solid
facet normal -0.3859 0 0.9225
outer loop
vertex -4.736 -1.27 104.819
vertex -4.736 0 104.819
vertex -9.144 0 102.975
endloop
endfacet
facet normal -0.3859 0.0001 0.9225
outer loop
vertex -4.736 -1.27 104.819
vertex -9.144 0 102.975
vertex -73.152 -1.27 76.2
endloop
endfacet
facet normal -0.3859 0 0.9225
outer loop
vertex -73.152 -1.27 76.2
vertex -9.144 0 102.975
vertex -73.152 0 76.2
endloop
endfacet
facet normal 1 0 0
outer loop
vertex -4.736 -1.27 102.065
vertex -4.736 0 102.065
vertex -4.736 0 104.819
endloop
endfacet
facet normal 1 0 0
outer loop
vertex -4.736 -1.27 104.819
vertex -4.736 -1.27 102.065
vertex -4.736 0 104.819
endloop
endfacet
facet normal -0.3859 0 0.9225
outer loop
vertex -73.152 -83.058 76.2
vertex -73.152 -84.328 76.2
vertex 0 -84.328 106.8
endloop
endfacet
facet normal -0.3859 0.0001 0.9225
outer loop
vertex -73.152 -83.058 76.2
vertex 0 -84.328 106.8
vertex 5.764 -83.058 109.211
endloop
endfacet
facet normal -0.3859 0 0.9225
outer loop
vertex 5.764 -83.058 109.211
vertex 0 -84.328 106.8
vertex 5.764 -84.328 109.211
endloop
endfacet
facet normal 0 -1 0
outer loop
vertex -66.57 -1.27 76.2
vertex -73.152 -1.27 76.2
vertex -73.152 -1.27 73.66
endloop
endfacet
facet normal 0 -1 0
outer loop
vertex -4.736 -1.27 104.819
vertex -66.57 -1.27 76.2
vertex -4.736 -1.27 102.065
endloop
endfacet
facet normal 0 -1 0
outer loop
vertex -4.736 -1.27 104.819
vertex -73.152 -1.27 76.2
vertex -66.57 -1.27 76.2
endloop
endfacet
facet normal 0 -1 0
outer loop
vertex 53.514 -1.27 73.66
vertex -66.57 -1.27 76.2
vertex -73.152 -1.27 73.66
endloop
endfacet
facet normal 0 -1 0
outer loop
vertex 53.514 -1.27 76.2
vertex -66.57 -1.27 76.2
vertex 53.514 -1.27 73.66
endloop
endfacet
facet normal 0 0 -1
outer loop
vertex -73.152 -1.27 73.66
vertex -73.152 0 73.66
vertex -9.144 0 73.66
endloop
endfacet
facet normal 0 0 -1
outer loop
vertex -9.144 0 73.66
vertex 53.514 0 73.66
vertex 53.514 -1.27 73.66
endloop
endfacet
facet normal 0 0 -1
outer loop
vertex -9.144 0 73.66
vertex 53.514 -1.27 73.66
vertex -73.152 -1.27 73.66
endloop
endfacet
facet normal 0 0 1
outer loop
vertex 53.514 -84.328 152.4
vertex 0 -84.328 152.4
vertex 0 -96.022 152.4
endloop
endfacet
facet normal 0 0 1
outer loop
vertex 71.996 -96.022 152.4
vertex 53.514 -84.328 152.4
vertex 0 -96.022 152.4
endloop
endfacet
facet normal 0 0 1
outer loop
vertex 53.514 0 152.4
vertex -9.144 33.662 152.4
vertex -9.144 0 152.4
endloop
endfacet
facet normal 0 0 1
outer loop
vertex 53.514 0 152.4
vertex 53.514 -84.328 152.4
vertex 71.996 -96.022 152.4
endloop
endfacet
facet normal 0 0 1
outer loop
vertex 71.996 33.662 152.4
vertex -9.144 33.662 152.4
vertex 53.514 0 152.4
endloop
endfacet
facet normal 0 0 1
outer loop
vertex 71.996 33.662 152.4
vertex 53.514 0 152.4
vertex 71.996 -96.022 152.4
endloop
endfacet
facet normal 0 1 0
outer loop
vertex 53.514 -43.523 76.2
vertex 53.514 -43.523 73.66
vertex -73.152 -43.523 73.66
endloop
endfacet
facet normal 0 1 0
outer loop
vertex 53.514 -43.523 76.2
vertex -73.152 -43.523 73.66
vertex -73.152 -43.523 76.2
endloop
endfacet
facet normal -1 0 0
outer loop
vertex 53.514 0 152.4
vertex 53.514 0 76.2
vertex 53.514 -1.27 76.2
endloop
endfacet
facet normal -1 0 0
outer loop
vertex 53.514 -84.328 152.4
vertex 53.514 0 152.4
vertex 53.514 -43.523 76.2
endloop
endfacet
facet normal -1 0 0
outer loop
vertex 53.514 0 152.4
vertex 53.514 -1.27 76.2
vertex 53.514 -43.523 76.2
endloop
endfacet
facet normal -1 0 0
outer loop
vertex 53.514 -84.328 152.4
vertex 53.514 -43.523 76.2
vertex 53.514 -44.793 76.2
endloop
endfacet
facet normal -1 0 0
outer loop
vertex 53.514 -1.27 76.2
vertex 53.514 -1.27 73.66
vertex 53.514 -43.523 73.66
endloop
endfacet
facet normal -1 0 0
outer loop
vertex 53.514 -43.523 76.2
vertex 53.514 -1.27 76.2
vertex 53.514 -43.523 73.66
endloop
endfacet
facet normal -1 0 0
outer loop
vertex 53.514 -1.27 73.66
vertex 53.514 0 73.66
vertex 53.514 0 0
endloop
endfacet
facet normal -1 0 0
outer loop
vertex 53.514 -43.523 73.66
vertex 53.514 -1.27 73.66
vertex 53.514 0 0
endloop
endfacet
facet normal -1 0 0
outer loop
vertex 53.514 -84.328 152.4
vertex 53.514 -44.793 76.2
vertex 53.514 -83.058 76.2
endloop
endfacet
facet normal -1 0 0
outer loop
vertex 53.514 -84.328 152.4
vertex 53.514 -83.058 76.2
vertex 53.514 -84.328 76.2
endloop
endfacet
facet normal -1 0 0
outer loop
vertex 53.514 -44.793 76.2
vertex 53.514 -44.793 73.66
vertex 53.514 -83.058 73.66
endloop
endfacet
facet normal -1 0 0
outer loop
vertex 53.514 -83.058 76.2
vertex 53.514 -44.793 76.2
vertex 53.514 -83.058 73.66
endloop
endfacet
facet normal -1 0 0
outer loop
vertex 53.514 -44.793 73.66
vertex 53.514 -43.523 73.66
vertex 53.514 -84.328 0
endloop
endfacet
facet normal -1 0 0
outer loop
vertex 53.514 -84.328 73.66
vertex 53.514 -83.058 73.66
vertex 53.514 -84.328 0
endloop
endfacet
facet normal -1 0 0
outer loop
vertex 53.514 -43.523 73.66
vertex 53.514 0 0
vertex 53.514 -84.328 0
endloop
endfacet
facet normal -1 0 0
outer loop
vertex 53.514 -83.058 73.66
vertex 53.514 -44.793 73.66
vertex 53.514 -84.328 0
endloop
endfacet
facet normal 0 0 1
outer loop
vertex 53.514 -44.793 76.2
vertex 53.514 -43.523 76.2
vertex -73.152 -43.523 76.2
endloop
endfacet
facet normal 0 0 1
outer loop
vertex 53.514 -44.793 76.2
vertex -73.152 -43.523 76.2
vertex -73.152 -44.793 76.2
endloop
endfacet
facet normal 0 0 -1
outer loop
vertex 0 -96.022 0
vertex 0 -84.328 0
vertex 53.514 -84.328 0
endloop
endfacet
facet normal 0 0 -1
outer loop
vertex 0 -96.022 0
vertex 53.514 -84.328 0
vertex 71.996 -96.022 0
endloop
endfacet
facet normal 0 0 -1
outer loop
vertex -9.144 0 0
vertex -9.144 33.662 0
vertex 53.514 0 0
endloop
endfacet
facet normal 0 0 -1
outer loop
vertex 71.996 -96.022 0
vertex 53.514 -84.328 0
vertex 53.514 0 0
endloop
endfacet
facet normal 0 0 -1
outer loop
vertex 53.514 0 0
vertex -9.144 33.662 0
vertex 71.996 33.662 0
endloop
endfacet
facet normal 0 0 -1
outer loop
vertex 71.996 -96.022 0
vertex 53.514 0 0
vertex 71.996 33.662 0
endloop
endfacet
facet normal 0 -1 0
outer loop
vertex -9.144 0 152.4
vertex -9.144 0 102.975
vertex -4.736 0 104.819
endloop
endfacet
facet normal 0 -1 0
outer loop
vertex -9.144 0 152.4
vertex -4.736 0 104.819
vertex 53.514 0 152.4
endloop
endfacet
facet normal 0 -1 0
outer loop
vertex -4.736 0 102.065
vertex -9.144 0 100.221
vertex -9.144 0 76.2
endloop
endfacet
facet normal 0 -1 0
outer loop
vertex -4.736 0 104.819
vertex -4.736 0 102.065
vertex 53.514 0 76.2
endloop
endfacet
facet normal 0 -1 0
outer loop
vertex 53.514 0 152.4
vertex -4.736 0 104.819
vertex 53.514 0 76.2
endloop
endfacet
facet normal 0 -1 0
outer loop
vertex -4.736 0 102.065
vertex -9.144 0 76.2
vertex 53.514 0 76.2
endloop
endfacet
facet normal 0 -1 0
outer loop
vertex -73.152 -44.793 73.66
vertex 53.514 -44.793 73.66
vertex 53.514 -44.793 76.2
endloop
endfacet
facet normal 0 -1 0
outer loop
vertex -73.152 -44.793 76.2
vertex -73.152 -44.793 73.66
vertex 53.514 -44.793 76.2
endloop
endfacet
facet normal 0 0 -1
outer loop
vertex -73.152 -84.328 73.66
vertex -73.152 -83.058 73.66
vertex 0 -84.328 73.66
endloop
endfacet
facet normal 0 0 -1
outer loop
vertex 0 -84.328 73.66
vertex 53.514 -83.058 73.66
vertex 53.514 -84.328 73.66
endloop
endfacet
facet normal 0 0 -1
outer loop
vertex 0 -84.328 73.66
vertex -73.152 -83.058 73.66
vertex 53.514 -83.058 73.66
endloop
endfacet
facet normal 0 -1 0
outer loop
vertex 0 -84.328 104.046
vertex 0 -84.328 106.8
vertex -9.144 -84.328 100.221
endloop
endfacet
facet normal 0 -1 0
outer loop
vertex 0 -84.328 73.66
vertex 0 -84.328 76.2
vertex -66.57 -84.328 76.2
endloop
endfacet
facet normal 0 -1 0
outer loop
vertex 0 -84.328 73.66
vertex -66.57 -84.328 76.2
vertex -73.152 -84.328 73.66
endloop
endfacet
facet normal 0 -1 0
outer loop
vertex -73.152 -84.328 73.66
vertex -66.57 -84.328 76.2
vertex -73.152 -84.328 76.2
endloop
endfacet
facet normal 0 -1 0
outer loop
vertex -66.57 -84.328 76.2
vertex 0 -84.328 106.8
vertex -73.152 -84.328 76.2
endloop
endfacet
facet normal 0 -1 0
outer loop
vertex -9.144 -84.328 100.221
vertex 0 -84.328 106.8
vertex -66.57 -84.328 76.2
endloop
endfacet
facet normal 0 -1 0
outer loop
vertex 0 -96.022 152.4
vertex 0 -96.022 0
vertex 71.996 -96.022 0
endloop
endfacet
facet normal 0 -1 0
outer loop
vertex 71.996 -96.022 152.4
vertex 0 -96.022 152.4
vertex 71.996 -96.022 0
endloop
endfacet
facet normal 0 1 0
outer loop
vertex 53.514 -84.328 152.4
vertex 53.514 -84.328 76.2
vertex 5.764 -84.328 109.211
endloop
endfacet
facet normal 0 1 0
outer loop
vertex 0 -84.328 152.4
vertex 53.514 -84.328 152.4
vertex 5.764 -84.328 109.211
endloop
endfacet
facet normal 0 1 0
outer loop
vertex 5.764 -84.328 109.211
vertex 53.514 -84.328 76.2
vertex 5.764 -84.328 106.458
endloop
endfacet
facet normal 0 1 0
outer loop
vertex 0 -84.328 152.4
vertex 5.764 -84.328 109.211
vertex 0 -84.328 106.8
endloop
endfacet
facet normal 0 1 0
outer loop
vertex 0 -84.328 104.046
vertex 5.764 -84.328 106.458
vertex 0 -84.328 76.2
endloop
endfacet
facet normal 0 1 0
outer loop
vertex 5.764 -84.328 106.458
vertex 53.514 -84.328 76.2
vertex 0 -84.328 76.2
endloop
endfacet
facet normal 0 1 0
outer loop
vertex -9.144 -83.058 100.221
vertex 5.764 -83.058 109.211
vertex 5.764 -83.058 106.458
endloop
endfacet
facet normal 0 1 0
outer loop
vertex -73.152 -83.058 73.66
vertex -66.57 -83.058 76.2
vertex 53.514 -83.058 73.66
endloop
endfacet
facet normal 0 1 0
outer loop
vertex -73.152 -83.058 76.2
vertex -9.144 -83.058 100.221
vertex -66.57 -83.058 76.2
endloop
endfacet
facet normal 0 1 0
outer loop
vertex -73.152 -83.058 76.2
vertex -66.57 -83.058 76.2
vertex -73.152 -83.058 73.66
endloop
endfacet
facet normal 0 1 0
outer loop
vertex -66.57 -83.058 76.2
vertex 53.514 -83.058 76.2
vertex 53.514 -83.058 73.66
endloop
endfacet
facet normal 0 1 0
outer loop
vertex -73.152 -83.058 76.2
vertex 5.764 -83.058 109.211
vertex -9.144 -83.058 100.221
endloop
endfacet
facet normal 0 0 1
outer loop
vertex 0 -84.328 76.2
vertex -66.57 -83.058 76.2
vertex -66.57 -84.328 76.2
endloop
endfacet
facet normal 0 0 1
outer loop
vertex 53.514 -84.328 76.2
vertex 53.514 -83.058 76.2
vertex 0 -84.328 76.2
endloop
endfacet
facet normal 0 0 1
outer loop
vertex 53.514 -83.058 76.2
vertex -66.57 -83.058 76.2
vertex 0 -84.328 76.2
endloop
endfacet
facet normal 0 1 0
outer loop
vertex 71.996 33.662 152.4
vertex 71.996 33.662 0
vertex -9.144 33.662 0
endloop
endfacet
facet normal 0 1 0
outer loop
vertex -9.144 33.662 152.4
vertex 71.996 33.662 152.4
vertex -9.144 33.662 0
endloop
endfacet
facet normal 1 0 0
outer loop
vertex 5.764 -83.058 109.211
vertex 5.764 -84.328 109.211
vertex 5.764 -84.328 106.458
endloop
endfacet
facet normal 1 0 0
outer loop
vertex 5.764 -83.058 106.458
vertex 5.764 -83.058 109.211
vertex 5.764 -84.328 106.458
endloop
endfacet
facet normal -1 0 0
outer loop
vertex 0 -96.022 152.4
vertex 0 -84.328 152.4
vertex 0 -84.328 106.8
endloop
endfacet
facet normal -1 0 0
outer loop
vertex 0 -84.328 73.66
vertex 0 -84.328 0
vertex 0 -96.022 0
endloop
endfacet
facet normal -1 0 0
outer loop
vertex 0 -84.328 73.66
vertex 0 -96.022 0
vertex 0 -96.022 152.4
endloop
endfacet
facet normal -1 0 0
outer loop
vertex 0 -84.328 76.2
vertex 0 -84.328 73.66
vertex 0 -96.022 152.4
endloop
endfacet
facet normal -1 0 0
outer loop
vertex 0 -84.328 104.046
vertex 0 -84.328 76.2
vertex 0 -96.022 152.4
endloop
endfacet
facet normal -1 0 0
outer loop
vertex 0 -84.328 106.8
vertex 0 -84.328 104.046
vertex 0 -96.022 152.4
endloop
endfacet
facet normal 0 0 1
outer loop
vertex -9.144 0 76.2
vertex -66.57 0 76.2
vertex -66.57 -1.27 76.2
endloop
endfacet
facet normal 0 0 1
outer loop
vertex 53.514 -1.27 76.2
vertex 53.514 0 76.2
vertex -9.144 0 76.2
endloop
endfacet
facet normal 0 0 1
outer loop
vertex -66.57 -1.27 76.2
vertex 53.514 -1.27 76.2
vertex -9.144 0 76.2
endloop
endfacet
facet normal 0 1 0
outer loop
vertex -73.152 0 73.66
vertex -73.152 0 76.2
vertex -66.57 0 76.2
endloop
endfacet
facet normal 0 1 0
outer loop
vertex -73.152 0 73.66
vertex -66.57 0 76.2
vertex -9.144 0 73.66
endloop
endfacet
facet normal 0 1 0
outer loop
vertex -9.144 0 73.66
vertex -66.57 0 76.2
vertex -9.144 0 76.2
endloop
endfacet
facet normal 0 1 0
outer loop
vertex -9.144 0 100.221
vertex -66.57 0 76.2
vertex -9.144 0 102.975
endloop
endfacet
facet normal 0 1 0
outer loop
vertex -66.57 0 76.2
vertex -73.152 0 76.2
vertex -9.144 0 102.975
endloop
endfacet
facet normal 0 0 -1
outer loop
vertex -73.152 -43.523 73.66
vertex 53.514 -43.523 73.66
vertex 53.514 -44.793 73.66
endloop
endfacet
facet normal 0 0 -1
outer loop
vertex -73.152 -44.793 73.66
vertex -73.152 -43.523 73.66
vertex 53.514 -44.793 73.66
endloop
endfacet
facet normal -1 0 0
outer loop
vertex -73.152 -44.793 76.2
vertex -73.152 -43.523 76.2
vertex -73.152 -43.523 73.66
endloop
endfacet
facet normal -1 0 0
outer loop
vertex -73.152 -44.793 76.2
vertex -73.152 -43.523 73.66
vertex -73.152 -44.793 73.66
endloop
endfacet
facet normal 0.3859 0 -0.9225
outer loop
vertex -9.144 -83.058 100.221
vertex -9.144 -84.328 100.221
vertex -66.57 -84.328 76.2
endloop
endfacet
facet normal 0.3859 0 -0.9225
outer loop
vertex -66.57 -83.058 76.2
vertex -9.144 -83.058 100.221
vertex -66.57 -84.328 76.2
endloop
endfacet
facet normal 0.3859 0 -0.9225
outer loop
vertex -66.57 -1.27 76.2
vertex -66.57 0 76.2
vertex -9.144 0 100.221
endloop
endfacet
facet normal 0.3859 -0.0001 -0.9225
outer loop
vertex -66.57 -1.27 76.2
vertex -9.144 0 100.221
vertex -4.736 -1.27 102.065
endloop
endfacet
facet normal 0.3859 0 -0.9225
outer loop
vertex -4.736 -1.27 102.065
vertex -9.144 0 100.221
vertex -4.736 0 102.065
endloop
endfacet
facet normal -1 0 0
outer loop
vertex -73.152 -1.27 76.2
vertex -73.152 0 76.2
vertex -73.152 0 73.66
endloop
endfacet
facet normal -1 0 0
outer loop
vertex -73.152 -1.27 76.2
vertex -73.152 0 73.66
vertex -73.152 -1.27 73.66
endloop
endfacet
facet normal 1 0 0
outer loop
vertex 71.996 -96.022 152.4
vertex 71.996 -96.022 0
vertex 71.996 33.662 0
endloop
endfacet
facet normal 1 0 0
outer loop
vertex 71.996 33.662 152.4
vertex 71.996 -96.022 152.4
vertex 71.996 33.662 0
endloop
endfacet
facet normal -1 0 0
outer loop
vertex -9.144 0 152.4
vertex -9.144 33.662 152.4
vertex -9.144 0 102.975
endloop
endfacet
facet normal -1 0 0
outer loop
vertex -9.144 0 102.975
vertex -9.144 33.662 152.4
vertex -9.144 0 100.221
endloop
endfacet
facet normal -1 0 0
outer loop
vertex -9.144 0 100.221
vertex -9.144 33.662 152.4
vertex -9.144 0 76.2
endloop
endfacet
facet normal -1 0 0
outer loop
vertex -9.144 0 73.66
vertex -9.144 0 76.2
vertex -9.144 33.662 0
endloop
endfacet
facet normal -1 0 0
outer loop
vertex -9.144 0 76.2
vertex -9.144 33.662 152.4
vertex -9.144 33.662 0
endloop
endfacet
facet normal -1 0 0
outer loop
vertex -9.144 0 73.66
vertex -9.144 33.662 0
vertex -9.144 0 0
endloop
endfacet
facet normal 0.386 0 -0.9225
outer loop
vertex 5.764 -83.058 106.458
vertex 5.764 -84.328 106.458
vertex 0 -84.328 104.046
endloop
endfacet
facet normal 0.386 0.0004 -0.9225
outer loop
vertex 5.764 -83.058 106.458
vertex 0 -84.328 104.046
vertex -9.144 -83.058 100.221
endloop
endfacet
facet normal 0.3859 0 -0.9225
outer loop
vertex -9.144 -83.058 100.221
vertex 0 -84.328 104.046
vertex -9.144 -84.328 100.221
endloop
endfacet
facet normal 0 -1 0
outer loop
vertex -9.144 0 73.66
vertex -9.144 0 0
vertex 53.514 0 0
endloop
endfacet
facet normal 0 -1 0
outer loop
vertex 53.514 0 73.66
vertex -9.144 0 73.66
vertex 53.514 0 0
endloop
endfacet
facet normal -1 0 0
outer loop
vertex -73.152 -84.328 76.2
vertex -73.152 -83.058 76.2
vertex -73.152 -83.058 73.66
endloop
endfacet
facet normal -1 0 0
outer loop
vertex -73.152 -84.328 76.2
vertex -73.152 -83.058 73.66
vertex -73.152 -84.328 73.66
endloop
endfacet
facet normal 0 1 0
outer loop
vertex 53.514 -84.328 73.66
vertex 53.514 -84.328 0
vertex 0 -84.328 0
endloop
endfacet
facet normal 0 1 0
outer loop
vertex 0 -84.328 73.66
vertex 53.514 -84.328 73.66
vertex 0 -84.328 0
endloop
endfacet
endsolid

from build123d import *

# Parameters (mm, degrees)
F2_DEPTH  = 152.4
F3_W      = 1.27
F3_H      = 2.54
F4_DEPTH  = 126.6662840818
F8_DEPTH  = 1.27
F12_DEPTH = 1.27


# Not quite as in the source:
# - the program builds the solid bodies; features that only make, move or delete a surface that nothing else refers to are left out


with BuildPart() as f2:
    # F1 (on Top) → F2 (new body)
    with BuildSketch(Plane.XY):
        Polygon((-9.144, 0), (53.5142840818, 0), (53.5142840818, -84.328), (0, -84.328), (0, -96.0219023137), (53.5142840818, -96.0219023137), (71.9958739355, -96.0219023137), (71.9958739355, 33.6619690061), (53.5142840818, 33.6619690061), (-9.144, 33.6619690061), align=None)
    extrude(amount=F2_DEPTH)

    # F3 (on face) → F4 (join, through all)
    with BuildSketch(Plane(origin=(53.5142840818, 0, 0), x_dir=(0, -1, 0), z_dir=(-1, 0, 0))):
        with Locations((0.635, 74.93)):
            Rectangle(F3_W, F3_H)
        with Locations((83.693, 74.93)):
            Rectangle(F3_W, F3_H)
        with Locations((44.1576857662, 74.93)):
            Rectangle(F3_W, F3_H)
    extrude(amount=F4_DEPTH)

    # F7 (on face) → F8 (join)
    with BuildSketch(Plane.XZ):
        Polygon((-4.7359238379, 104.818597436), (-73.152, 76.2), (-66.5699955492, 76.2), (-4.7359238379, 102.0653302762), align=None)
    extrude(amount=F8_DEPTH)

    # F11 (on face) → F12 (join)
    with BuildSketch(Plane(origin=(0, -84.328, 0), x_dir=(-1, 0, 0), z_dir=(0, 1, 0))):
        Polygon((-5.7641793689, 106.457546895), (9.144, 100.221422174), (66.5699955492, 76.2), (73.152, 76.2), (9.144, 102.9746893338), (-5.7641793689, 109.2108140547), align=None)
    extrude(amount=F12_DEPTH)


solid = f2.part
